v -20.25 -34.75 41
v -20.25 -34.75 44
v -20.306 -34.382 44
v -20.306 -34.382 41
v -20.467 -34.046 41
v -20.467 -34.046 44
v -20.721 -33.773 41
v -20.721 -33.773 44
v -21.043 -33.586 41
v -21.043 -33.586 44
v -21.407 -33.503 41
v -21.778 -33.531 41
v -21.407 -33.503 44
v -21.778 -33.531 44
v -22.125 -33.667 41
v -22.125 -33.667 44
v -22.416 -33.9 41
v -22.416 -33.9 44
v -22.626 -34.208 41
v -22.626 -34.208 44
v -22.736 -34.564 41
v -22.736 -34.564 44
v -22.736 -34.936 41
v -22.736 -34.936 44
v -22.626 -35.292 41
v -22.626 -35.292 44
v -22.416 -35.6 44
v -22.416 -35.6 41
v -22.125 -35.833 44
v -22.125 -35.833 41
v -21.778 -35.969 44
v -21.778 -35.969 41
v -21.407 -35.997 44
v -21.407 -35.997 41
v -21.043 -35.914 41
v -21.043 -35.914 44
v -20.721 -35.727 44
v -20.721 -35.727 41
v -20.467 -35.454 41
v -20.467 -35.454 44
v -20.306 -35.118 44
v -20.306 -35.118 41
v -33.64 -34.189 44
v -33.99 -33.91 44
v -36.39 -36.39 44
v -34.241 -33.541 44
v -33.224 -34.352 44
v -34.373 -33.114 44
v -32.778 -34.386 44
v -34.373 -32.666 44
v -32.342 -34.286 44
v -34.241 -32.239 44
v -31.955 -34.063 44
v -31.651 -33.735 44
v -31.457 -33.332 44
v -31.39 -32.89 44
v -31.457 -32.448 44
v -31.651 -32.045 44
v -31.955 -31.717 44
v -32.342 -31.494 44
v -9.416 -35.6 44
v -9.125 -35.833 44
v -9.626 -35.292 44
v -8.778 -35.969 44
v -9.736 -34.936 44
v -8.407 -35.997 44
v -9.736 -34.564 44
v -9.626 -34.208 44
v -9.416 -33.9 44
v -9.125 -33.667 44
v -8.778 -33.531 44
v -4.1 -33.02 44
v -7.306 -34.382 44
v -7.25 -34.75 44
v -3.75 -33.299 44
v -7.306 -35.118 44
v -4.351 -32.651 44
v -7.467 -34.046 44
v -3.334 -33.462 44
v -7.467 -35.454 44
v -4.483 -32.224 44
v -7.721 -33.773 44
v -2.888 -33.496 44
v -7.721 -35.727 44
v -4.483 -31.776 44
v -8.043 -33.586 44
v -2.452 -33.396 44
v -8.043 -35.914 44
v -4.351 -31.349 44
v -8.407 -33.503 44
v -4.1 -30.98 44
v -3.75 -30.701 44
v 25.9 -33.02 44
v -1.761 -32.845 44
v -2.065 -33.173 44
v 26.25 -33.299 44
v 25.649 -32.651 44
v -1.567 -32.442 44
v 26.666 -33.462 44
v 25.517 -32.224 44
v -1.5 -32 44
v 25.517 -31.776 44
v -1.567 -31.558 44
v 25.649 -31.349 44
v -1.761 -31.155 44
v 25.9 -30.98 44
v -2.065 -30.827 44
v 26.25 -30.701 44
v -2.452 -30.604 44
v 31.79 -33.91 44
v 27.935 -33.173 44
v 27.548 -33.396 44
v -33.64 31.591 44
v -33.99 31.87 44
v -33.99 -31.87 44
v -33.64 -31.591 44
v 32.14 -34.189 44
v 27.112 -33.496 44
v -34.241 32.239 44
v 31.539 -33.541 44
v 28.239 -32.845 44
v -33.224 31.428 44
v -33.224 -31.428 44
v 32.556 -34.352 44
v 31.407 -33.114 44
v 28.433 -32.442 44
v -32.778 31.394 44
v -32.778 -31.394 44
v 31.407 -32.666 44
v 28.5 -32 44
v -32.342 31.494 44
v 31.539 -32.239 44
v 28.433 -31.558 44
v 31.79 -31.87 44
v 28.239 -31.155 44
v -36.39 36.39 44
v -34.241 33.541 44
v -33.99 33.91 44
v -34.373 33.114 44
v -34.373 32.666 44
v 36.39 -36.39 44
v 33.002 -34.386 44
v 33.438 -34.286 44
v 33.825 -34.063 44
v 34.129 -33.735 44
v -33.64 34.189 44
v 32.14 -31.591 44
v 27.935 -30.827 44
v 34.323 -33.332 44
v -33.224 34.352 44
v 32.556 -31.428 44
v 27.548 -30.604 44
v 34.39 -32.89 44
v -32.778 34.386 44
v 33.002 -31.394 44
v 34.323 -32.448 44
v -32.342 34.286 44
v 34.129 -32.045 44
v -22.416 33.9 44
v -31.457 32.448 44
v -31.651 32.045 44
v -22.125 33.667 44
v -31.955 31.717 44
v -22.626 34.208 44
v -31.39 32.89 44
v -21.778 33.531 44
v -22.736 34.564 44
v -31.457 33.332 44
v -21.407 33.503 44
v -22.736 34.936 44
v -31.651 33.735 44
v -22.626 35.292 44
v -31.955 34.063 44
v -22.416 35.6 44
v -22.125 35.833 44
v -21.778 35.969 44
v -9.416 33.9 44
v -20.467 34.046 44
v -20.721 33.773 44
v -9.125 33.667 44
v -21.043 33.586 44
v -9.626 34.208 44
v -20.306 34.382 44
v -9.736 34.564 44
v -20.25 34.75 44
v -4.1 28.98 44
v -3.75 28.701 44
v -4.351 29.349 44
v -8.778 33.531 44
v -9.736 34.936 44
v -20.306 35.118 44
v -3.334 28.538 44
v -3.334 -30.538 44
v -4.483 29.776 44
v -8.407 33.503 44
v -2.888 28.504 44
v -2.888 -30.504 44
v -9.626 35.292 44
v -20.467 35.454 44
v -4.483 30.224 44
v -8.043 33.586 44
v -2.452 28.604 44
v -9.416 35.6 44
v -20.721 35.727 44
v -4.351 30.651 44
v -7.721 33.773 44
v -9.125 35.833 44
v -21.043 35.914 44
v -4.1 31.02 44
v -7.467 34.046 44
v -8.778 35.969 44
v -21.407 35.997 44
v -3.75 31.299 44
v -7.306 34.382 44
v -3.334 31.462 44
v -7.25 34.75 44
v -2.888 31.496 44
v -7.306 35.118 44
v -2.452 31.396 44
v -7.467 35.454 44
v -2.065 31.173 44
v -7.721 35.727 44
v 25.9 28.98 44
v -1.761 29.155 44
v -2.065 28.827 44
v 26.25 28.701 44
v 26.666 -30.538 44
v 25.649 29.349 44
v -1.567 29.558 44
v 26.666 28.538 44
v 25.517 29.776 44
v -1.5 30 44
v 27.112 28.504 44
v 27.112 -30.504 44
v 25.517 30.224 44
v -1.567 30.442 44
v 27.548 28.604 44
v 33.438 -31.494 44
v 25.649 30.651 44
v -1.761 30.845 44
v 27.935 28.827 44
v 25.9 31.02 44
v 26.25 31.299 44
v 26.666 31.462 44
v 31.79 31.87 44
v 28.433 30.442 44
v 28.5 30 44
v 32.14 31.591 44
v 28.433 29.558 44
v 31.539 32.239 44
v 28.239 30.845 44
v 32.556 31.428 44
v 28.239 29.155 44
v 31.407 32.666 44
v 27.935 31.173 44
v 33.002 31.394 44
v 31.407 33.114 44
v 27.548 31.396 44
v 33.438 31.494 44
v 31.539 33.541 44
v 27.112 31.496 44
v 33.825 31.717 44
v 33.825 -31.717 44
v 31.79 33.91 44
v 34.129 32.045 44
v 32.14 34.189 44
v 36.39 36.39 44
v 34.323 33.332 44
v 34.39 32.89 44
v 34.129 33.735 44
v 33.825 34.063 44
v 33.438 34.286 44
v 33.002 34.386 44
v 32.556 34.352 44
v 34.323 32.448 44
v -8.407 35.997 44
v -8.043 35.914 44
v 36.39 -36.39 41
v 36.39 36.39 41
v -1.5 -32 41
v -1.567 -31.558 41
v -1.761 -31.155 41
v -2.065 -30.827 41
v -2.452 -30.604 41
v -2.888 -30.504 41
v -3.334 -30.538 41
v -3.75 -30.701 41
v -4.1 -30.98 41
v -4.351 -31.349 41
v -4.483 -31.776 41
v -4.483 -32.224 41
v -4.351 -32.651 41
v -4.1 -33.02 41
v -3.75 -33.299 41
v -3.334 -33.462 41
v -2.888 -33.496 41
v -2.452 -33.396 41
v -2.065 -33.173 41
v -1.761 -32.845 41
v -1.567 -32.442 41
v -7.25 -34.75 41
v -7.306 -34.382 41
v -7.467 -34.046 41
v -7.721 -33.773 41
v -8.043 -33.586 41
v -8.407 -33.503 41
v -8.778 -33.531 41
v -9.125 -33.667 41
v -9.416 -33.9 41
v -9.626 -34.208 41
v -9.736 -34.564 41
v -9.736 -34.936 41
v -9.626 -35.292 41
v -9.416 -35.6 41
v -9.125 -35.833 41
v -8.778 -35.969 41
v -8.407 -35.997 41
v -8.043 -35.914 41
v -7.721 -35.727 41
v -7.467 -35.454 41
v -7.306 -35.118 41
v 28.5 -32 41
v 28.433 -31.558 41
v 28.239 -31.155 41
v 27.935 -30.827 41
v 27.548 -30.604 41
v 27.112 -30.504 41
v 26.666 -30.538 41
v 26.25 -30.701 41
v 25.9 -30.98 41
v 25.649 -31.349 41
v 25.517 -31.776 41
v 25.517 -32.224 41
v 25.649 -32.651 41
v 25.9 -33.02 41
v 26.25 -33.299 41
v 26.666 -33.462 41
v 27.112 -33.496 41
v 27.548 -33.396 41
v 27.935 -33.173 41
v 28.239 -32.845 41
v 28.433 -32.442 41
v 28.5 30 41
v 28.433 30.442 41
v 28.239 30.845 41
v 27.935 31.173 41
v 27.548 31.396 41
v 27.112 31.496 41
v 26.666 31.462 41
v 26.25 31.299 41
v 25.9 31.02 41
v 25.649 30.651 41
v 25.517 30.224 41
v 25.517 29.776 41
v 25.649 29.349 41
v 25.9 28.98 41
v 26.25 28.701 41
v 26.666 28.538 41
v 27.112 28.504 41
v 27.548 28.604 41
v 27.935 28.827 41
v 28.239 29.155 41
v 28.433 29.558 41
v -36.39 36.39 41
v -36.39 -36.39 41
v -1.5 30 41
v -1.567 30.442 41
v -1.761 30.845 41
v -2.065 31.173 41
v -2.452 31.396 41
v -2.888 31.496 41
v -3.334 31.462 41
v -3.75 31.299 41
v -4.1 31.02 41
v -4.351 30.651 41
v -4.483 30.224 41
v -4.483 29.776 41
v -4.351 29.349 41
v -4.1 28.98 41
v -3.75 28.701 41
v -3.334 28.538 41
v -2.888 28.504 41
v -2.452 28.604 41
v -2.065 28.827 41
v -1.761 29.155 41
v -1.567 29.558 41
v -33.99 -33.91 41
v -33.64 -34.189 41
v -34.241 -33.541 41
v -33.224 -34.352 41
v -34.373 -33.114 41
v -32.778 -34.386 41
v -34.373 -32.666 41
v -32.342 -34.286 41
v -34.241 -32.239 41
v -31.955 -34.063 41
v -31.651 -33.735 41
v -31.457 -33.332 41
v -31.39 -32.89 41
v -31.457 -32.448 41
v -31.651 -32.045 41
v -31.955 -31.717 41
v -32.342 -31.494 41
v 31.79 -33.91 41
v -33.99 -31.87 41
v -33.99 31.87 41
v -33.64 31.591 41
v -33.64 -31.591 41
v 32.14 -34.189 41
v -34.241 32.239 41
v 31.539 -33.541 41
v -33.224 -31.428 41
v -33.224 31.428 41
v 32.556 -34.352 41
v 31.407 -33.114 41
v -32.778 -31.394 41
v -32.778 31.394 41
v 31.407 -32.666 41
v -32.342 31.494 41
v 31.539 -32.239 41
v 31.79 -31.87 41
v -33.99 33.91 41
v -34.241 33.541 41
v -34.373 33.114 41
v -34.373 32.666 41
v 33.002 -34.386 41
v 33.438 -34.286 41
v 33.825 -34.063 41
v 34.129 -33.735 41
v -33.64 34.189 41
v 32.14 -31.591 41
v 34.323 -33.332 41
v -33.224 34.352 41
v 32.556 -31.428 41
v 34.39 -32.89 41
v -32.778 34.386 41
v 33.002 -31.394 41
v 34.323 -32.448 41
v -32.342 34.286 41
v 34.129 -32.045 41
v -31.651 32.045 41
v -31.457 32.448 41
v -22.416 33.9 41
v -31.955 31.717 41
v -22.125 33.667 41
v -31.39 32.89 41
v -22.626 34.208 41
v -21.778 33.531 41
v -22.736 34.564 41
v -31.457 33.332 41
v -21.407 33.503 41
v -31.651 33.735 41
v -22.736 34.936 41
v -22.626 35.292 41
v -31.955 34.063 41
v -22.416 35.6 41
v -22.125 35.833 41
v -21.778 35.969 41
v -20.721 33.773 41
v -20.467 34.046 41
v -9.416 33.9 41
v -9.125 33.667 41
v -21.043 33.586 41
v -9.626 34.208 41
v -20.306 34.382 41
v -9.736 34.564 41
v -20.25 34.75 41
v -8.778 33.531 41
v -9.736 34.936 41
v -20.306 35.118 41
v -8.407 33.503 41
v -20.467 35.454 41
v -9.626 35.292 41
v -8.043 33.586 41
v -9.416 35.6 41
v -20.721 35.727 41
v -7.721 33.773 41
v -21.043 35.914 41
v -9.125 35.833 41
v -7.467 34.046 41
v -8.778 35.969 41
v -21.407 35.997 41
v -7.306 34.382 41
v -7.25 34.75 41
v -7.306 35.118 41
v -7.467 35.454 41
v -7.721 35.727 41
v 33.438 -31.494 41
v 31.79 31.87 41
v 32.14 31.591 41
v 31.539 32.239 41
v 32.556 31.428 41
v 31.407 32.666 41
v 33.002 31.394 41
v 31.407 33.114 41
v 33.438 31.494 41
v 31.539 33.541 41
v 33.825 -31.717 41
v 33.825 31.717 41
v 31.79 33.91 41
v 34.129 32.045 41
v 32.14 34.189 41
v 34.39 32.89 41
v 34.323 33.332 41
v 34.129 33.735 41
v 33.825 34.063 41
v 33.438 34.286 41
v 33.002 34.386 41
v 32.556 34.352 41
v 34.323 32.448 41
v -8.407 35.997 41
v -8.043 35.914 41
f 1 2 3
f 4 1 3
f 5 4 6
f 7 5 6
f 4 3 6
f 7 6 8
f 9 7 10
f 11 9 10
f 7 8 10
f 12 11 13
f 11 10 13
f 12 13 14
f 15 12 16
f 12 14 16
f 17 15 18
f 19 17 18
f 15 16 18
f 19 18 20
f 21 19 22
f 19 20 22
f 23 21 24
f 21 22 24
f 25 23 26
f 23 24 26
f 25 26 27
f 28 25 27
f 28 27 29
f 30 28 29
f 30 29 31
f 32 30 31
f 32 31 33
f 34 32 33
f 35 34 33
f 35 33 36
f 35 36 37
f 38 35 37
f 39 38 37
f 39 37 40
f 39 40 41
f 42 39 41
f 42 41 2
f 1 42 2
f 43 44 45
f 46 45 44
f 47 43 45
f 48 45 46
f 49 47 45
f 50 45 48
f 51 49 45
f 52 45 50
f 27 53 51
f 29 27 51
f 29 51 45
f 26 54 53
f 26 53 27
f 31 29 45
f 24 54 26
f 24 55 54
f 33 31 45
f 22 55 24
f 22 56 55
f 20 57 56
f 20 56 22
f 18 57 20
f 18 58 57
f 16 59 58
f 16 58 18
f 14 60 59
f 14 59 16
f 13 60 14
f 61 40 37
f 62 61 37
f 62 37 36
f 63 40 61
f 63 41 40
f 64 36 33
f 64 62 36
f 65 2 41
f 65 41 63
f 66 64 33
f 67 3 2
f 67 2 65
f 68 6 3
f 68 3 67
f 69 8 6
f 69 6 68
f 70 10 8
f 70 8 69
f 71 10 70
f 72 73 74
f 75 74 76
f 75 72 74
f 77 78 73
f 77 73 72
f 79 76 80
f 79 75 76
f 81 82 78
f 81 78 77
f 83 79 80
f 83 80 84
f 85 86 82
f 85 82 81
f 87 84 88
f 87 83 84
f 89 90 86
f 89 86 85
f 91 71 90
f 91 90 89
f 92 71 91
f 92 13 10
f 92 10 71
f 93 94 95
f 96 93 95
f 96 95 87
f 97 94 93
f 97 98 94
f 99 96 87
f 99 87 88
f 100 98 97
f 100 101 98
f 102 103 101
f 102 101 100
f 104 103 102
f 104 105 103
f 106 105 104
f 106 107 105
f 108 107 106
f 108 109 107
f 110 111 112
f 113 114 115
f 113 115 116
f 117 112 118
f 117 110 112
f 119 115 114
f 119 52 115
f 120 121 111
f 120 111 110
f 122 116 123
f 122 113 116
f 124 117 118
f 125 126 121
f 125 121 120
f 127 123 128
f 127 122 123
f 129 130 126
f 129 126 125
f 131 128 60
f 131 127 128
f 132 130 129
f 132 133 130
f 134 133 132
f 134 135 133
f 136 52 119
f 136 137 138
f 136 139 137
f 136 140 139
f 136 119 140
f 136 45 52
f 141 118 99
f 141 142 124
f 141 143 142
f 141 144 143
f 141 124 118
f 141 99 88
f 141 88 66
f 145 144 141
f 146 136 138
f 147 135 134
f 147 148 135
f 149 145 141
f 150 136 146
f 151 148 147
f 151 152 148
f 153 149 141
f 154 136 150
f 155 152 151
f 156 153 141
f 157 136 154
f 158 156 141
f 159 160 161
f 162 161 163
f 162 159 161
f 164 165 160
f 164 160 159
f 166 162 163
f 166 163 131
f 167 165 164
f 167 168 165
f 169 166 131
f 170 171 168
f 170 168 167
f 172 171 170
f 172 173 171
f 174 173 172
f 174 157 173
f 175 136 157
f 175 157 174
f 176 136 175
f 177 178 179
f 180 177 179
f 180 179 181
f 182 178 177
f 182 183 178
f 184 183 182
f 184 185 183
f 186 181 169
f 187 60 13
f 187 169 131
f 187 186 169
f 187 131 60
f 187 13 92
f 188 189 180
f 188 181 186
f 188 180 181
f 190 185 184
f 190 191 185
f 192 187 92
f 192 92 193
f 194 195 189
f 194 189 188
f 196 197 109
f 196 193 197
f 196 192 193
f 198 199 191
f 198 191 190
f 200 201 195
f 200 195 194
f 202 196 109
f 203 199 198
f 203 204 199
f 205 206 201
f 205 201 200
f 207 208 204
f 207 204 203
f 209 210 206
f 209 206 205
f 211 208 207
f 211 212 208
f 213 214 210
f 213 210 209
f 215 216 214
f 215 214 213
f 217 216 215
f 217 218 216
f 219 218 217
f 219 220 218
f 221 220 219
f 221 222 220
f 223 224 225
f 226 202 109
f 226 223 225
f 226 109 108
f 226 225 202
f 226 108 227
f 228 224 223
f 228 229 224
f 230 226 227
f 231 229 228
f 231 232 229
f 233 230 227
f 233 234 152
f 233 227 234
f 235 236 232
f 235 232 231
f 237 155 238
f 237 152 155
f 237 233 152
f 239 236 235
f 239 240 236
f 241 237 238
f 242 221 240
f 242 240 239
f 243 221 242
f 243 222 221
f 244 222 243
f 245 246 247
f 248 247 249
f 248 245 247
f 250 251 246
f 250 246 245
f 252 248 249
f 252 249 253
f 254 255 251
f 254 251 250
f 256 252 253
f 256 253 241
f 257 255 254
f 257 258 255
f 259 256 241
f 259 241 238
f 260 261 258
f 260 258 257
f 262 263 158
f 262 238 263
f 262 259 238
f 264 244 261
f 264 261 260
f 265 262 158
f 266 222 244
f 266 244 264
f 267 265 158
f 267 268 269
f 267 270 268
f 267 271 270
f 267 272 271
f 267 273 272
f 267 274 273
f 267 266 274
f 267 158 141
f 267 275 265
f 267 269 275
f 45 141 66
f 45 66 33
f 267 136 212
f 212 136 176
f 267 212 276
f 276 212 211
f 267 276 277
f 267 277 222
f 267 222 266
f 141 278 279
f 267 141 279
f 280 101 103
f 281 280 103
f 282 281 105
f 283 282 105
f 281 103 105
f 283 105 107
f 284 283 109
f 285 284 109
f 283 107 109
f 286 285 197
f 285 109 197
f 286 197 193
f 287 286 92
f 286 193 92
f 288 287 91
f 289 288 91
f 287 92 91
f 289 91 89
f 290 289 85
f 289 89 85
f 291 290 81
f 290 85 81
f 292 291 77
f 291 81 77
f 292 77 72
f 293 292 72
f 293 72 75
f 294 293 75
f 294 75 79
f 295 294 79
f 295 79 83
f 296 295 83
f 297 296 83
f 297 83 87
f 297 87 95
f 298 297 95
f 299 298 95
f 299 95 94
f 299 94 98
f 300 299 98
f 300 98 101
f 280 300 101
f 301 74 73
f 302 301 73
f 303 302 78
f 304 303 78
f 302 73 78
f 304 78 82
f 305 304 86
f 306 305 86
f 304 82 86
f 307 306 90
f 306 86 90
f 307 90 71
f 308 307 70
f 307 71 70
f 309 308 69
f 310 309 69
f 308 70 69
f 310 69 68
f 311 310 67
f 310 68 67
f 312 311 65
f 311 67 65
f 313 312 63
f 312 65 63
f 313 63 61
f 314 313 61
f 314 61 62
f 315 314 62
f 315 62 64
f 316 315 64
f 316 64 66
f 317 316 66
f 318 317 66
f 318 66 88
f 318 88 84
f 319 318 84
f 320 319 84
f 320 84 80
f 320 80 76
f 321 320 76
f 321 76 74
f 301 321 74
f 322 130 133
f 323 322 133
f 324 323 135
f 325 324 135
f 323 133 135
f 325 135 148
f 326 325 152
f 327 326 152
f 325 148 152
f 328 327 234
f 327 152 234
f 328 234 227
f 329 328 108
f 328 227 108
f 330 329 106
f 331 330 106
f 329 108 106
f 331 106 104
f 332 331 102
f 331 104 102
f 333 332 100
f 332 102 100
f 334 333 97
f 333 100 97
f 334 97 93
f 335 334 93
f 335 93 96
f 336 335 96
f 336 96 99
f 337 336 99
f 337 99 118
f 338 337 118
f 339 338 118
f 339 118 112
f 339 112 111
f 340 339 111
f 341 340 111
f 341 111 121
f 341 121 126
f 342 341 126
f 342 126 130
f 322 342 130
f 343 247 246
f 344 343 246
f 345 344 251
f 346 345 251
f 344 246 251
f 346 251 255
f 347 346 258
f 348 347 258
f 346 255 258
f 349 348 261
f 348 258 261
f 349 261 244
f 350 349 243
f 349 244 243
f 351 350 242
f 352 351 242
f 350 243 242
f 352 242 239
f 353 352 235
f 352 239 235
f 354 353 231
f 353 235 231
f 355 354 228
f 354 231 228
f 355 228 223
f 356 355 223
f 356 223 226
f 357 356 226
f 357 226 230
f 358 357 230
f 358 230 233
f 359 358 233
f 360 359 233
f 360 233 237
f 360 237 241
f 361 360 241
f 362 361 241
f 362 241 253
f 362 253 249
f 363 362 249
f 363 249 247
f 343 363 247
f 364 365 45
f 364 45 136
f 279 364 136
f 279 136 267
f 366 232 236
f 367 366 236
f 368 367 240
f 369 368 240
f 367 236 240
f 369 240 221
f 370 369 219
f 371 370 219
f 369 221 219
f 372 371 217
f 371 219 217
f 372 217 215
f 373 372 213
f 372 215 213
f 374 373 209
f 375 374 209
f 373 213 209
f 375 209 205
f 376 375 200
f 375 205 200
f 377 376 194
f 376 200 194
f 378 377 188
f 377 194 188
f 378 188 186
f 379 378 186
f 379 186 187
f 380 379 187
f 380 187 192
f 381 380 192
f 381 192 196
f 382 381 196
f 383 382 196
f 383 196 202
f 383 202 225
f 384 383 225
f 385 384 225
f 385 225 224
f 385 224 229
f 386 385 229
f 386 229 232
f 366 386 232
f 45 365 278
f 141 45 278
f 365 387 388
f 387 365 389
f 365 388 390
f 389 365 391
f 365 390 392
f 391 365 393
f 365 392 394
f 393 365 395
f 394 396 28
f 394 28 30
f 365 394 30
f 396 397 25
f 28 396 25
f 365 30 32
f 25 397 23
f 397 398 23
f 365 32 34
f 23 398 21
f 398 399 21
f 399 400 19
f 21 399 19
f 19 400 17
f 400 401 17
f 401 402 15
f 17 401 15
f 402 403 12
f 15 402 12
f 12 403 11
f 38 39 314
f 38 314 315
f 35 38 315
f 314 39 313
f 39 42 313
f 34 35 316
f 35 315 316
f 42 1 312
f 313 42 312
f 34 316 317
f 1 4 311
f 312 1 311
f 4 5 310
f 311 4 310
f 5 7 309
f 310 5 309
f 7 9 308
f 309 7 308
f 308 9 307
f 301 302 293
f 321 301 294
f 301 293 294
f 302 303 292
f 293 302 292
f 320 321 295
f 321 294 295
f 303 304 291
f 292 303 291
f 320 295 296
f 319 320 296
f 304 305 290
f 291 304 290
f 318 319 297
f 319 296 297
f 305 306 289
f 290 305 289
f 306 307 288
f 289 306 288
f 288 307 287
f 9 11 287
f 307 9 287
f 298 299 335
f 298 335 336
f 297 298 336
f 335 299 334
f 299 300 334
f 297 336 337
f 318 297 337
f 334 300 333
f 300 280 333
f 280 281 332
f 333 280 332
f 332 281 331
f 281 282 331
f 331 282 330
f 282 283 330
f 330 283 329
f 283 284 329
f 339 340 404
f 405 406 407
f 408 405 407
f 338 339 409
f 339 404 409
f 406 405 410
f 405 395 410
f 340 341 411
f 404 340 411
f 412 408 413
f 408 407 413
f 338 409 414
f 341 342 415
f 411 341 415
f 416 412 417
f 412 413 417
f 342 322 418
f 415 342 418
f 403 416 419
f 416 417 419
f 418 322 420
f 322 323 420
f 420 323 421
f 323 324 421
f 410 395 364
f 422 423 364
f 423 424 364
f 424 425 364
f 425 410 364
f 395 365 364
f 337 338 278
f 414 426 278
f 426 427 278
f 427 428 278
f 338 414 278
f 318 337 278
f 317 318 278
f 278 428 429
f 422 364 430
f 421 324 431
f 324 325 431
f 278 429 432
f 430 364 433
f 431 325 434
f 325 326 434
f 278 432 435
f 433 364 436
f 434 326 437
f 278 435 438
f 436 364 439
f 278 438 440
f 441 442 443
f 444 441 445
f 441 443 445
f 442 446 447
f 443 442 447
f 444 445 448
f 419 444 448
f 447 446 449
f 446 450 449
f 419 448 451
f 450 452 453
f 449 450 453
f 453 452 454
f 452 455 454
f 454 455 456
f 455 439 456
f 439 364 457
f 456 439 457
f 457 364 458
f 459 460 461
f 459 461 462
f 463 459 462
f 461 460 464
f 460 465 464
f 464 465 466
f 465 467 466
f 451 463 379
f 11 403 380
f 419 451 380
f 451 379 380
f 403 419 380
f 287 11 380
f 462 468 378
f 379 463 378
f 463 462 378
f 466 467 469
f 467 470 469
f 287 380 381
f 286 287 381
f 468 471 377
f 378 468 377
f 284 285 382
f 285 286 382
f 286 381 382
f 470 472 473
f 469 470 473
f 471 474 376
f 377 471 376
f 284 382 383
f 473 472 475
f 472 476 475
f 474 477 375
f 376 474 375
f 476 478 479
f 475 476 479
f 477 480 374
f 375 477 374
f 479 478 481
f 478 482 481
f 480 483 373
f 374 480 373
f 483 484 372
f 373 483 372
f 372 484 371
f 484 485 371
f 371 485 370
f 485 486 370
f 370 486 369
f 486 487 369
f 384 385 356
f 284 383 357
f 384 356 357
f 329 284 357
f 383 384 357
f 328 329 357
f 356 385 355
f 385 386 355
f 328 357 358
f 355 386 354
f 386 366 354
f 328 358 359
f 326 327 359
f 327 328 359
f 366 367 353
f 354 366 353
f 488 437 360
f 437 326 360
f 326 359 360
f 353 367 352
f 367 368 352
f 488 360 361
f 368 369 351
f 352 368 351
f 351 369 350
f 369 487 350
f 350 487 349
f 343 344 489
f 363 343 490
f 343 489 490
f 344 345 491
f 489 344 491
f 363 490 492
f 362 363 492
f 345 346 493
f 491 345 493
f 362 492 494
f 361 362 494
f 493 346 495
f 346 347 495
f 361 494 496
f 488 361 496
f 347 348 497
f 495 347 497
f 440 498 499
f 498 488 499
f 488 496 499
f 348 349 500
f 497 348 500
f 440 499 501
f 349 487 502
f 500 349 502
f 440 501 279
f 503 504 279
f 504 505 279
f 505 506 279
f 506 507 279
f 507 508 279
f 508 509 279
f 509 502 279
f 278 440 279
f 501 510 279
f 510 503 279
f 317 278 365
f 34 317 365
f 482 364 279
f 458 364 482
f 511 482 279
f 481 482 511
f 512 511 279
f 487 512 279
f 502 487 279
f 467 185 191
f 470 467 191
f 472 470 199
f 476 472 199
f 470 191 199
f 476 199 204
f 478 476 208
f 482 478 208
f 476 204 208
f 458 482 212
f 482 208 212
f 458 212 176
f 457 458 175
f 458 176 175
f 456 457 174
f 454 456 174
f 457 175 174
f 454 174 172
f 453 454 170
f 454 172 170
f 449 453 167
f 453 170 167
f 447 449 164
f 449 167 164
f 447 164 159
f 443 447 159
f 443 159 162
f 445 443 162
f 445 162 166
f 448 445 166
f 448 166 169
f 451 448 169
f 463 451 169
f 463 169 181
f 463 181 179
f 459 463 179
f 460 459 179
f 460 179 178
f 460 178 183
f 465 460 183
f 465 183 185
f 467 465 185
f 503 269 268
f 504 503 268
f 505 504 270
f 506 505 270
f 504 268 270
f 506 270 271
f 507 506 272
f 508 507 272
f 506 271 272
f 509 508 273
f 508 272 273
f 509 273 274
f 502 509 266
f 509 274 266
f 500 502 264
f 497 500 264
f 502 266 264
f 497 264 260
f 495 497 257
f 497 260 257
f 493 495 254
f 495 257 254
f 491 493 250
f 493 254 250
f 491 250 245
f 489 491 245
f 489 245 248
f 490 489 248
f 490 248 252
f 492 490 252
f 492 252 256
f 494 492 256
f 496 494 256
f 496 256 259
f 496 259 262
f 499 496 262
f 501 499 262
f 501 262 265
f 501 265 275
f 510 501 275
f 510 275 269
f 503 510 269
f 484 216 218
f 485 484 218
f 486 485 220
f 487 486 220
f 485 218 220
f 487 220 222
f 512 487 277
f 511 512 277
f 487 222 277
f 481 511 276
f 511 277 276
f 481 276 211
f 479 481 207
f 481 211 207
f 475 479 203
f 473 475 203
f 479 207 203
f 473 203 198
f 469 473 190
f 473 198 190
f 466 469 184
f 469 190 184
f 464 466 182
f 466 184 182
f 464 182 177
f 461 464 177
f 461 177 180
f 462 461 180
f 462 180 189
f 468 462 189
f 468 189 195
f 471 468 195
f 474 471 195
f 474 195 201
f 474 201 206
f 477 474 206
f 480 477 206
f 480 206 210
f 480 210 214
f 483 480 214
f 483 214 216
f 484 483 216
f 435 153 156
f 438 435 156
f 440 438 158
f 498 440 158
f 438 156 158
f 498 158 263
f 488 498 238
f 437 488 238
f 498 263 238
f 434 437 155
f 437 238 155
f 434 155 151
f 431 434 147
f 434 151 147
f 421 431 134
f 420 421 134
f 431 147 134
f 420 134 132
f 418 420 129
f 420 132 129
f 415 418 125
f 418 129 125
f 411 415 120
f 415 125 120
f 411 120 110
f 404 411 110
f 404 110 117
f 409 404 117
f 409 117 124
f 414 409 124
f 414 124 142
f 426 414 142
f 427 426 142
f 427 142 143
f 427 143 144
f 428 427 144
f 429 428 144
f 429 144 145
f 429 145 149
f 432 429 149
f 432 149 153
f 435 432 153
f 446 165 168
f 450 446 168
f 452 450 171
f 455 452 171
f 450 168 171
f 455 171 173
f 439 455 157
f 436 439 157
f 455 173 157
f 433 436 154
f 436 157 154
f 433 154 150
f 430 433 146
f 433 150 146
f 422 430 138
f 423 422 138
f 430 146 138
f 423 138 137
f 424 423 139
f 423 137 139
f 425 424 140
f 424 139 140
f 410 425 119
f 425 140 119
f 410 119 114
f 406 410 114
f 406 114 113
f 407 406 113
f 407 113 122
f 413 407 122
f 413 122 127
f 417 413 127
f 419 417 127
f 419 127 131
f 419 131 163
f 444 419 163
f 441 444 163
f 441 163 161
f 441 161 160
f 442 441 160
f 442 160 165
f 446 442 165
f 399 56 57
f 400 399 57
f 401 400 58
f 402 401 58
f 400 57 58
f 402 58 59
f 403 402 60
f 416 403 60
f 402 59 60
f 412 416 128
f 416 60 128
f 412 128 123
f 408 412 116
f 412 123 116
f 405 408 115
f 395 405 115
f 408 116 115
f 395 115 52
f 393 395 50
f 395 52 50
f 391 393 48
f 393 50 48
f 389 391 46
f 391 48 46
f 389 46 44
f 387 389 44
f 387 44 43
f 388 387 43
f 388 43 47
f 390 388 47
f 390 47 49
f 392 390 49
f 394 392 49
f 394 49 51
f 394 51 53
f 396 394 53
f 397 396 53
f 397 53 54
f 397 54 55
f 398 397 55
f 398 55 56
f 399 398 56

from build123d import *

# Parameters (mm, degrees)
SKETCH019_W     = 72.78
SKETCH019_H     = 72.78
PAD009_DEPTH    = 3
SKETCH040_R     = 1.5
POCKET007_DEPTH = 3.001
SKETCH046_R     = 1.5
POCKET008_DEPTH = 3.001
SKETCH079_R     = 1.25
POCKET016_DEPTH = 3.001


with BuildPart() as part:
    # Sketch019 → Pad009 (new body)
    with BuildSketch(Plane.XY):
        Rectangle(SKETCH019_W, SKETCH019_H)
    extrude(amount=PAD009_DEPTH)

    # Sketch040 → Pocket007 (cut, through all)
    with BuildSketch(Plane.XY.offset(3)):
        with Locations((-32.89, 32.89)):
            Circle(SKETCH040_R)
        with Locations((32.89, 32.89)):
            Circle(SKETCH040_R)
        with Locations((-32.89, -32.89)):
            Circle(SKETCH040_R)
        with Locations((32.89, -32.89)):
            Circle(SKETCH040_R)
    extrude(amount=-POCKET007_DEPTH, mode=Mode.SUBTRACT)

    # Sketch046 (on Face5 of Pocket007) → Pocket008 (cut, through all)
    with BuildSketch(Plane.XY.offset(3)):
        with Locations((-3, 30)):
            Circle(SKETCH046_R)
        with Locations((27, 30)):
            Circle(SKETCH046_R)
        with Locations((-3, -32)):
            Circle(SKETCH046_R)
        with Locations((27, -32)):
            Circle(SKETCH046_R)
    extrude(amount=-POCKET008_DEPTH, mode=Mode.SUBTRACT)

    # Sketch079 (on Face5 of Pocket008) → Pocket016 (cut, through all)
    with BuildSketch(Plane.XY.offset(3)):
        with Locations((-21.5, 34.75)):
            Circle(SKETCH079_R)
        with Locations((-8.5, 34.75)):
            Circle(SKETCH079_R)
        with Locations((-21.5, -34.75)):
            Circle(SKETCH079_R)
        with Locations((-8.5, -34.75)):
            Circle(SKETCH079_R)
    extrude(amount=-POCKET016_DEPTH, mode=Mode.SUBTRACT)


with BuildPart() as part_1:
    # Body002 placement: moved
    add(part.part.moved(Location((0, 0, 41))))


solid = part_1.part
